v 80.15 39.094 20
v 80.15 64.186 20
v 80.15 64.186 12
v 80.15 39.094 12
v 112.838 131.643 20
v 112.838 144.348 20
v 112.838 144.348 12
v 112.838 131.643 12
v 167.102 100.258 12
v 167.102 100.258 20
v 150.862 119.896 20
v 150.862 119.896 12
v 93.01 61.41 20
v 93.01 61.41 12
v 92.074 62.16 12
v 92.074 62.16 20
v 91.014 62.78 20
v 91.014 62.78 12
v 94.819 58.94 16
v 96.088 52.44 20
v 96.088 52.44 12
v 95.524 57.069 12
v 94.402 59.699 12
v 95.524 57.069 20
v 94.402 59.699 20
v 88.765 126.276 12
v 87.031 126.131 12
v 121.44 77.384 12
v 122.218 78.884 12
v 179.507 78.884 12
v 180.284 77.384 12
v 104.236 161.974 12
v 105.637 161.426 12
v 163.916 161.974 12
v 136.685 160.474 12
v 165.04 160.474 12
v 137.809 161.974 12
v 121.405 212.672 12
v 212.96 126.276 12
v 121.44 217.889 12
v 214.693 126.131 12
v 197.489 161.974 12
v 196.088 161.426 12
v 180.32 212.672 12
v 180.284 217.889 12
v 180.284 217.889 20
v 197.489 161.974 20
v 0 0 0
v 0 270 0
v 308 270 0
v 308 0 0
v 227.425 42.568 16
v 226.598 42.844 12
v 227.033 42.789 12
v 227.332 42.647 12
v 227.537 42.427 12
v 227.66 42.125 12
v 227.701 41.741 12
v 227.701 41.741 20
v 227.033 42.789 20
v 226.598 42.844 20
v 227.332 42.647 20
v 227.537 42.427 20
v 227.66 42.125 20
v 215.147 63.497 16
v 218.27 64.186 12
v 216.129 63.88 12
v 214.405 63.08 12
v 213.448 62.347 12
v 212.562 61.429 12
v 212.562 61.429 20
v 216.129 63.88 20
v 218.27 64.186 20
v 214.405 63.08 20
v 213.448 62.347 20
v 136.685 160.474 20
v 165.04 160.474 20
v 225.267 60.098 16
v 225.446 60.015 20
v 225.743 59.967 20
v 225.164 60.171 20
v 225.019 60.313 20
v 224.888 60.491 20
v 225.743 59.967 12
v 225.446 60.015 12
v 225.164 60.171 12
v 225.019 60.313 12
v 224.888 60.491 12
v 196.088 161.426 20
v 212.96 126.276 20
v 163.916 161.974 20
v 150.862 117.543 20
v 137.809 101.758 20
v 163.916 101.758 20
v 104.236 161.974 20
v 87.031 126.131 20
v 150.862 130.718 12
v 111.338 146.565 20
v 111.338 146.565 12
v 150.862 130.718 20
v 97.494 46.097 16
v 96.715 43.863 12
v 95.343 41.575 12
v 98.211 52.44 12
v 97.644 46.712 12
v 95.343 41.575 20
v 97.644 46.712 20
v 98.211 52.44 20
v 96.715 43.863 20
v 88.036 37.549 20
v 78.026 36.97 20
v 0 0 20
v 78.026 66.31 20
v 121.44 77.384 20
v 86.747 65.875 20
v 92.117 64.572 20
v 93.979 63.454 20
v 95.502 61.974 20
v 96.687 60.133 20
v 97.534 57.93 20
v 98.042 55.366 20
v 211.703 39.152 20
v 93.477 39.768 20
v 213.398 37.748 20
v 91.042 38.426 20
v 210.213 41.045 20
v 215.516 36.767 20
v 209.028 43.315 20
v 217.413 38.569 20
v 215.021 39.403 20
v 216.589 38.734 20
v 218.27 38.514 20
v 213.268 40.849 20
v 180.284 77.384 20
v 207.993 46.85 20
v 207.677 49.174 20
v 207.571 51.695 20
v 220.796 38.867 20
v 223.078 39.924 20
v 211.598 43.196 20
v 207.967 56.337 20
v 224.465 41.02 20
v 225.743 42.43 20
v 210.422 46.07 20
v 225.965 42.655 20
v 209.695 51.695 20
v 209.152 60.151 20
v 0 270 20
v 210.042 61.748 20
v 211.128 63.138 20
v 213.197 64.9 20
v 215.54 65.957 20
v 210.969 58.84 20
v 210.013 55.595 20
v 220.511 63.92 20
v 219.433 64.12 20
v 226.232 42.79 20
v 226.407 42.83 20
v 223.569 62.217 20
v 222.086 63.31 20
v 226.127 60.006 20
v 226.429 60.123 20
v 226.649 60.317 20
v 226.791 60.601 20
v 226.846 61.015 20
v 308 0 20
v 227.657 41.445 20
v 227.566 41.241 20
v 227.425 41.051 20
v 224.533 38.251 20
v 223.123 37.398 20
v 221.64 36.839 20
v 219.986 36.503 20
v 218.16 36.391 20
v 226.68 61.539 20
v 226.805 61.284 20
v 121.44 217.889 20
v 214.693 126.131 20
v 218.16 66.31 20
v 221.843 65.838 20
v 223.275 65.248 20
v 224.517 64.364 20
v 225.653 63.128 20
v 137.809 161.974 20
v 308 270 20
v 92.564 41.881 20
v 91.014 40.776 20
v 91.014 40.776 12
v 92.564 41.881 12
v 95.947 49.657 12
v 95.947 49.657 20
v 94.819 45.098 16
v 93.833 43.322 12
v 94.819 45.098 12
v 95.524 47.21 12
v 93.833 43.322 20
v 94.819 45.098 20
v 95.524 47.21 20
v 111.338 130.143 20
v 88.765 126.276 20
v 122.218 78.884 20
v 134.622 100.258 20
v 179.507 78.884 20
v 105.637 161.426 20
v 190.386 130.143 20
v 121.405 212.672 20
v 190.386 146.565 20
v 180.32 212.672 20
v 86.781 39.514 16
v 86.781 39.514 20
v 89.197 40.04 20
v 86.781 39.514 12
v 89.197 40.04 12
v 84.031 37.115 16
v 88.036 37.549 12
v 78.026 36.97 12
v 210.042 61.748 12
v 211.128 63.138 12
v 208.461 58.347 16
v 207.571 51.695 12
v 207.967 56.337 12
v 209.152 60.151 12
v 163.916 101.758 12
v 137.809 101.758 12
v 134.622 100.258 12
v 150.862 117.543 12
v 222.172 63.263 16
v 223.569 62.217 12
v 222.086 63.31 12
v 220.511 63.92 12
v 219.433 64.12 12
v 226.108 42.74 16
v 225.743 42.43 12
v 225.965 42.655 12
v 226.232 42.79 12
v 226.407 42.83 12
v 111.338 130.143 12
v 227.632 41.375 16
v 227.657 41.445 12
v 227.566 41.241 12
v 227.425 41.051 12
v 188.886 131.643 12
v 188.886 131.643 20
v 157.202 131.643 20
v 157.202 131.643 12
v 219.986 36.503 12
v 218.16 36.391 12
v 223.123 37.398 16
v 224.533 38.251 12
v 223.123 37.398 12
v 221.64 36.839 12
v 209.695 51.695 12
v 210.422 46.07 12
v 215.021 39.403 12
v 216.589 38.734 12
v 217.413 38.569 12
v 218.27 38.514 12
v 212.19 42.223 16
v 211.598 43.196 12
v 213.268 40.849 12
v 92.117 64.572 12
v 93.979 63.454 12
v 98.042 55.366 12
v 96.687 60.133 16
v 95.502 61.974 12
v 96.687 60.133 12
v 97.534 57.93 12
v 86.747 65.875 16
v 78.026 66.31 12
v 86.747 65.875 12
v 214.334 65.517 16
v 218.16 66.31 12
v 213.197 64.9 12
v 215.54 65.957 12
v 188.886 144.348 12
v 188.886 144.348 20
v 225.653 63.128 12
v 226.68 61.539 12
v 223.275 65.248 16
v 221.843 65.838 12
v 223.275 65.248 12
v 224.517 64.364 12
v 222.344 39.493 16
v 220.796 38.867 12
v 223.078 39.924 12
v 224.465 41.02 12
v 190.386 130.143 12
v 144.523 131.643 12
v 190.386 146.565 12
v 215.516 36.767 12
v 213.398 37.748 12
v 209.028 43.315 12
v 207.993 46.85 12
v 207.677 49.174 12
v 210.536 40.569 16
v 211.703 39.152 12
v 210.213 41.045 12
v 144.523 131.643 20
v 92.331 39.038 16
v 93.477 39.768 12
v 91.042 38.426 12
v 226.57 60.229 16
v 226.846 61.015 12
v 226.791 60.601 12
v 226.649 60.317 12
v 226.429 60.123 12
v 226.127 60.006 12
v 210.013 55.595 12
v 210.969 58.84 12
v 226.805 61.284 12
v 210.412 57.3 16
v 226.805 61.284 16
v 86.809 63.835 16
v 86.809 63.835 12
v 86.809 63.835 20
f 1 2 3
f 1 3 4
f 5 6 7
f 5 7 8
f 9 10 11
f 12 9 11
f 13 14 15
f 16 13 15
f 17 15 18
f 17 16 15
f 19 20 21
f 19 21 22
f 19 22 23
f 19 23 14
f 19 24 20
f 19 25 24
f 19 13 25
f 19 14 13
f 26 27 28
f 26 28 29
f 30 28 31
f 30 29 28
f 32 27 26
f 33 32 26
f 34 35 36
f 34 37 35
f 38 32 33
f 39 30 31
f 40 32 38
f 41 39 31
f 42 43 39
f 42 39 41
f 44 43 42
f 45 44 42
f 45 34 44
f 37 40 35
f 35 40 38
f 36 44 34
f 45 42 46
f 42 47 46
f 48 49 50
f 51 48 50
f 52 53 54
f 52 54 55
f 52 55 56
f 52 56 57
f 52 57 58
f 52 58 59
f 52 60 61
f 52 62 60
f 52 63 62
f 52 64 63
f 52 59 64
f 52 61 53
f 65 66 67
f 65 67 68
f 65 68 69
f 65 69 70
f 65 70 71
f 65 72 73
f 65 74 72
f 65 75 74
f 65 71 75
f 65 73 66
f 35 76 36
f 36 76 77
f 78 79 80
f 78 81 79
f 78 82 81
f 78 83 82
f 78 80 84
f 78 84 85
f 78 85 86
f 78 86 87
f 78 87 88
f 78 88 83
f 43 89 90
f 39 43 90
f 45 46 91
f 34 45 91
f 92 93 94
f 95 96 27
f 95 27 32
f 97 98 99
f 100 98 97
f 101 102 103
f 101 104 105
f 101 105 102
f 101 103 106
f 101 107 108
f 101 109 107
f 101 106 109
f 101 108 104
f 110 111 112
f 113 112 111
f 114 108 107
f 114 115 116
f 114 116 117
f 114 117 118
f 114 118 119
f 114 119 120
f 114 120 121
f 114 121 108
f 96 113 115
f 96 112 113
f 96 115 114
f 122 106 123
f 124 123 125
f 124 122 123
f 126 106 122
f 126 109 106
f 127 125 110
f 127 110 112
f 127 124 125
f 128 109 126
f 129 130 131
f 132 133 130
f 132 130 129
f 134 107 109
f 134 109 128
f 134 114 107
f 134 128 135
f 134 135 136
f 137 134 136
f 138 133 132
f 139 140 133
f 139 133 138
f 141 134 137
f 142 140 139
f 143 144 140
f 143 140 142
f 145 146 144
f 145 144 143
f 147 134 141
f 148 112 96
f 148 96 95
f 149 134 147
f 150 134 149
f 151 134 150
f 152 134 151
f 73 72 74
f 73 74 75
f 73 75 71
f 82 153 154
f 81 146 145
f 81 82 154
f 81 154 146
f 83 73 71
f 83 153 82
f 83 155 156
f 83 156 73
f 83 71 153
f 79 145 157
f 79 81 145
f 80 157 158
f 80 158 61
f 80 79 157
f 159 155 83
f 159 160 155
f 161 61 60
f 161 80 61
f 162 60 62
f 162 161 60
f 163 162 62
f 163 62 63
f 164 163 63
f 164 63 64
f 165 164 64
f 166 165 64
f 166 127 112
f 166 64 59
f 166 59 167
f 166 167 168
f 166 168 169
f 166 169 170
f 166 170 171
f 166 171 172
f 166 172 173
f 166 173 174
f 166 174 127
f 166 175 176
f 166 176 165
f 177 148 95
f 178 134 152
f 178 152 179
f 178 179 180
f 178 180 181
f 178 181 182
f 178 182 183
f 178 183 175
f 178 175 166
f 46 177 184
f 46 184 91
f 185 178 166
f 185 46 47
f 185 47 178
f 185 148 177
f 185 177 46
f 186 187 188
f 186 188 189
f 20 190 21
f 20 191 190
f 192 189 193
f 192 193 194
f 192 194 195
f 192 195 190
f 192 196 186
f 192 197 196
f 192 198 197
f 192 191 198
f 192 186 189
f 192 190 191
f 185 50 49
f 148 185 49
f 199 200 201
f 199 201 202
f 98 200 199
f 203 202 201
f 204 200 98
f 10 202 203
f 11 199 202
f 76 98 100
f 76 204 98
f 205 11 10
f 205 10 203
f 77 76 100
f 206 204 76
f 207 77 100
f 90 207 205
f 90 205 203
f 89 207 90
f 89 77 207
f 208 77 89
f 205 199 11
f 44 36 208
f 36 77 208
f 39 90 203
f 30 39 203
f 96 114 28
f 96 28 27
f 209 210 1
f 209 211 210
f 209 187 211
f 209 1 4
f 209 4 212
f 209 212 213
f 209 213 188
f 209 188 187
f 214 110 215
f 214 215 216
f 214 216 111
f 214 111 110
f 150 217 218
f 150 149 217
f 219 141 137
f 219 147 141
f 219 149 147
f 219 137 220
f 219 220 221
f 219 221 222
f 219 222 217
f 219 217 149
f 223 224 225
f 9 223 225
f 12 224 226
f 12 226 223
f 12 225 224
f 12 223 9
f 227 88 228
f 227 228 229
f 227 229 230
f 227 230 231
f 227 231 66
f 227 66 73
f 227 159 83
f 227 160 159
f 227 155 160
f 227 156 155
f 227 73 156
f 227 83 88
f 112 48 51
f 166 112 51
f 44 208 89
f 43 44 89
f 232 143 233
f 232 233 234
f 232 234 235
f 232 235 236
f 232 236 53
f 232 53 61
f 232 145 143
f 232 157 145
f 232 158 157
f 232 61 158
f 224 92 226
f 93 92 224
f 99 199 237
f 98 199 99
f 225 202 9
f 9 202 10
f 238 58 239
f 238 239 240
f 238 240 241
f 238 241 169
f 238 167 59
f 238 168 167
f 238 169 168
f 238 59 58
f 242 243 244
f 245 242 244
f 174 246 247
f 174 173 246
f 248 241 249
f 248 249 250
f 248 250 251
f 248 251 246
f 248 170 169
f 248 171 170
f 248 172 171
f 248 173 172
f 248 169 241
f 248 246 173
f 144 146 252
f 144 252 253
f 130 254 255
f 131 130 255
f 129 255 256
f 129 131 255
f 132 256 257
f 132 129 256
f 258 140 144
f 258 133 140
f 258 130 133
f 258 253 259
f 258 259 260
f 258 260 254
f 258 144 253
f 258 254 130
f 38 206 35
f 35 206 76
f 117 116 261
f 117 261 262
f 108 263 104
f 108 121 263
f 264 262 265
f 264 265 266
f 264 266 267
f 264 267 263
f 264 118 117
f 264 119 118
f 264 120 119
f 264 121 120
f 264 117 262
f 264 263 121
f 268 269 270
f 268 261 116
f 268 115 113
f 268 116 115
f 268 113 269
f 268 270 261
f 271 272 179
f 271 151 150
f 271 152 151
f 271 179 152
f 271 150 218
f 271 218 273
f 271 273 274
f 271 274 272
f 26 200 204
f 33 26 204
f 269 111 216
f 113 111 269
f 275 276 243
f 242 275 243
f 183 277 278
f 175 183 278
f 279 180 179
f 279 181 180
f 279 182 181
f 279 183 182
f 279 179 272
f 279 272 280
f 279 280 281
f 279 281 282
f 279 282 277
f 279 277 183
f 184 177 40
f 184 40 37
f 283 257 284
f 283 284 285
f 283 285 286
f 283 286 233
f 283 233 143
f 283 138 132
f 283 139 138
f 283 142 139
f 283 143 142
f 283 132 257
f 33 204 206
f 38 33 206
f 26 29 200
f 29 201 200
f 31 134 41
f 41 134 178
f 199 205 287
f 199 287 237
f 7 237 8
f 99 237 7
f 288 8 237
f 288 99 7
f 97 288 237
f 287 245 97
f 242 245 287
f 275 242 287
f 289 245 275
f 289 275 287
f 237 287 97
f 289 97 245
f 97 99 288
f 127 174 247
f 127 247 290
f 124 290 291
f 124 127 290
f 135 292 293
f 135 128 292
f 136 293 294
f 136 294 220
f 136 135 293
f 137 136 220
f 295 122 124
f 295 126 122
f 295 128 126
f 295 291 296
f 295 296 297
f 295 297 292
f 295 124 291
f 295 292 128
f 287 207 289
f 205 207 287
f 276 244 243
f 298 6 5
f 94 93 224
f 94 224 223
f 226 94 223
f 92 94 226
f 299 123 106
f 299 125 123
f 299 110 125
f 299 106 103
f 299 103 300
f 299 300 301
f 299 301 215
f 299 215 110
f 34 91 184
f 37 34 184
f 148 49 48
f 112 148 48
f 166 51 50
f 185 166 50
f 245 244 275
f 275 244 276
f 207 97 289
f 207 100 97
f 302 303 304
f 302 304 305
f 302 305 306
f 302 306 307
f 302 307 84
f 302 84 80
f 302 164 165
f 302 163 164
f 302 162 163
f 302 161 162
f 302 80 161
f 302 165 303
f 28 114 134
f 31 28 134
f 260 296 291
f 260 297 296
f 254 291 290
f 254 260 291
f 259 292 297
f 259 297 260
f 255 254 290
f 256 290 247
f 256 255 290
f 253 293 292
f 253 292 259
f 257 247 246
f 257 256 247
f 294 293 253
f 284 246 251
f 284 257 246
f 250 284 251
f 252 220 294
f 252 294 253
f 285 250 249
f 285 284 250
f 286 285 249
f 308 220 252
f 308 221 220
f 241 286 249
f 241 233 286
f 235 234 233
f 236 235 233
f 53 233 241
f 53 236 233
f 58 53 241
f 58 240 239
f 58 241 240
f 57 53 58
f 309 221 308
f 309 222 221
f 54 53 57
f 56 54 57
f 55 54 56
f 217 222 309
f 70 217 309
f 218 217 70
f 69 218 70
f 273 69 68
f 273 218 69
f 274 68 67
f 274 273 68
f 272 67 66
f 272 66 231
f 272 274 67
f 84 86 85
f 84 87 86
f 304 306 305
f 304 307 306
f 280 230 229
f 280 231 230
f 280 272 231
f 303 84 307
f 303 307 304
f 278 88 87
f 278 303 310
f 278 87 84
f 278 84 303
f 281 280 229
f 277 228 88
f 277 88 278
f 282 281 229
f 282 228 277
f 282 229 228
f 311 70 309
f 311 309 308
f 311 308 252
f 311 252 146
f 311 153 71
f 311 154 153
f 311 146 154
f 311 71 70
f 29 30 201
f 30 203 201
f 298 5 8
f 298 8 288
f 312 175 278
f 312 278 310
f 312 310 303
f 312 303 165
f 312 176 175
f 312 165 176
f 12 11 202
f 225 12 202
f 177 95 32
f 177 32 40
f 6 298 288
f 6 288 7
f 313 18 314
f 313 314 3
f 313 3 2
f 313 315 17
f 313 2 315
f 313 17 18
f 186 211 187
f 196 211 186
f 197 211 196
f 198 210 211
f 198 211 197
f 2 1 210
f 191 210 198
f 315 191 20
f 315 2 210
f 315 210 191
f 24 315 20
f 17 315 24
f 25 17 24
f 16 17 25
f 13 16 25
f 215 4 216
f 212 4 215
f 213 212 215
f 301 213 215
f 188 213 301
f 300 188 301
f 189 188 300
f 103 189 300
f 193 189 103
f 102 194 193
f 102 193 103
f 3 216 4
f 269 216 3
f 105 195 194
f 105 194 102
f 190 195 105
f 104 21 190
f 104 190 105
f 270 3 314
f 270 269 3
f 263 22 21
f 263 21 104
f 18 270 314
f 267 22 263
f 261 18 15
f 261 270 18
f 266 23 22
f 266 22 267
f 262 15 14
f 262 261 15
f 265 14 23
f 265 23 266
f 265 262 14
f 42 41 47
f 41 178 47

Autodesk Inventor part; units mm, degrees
ref_plane "YZ Plane" through (0, 0, 0) normal (1, 0, 0) x (0, 1, 0)
ref_plane "XZ Plane" through (0, 0, 0) normal (0, 1, 0) x (-1, 0, 0)
ref_plane "XY Plane" through (0, 0, 0) normal (0, 0, 1) x (1, 0, 0)
sketch "Sketch1" plane through (0, 0, 0) normal (0, 0, 1) x (1, 0, 0)
  line L0 (0, 0) -> (308, 0)
  line L1 (308, 0) -> (308, 270)
  line L2 (308, 270) -> (0, 270)
  line L3 (0, 270) -> (0, 0)
  dimension "d0" = 308
  dimension "d1" = 270
extrude "Extrusion1" add sketch "Sketch1" along normal blind 20
sketch "Sketch2" plane through (0, 0, 20) normal (0, 0, 1) x (1, 0, 0)
  line L0 (150.8623, 77.3843) -> (180.284, 77.3843)
  line L1 (180.284, 77.3843) -> (214.6934, 126.131)
  line L2 (214.6934, 126.131) -> (197.4887, 161.9741)
  line L3 (197.4887, 161.9741) -> (180.284, 217.8894)
  line L4 (180.284, 217.8894) -> (163.9156, 161.9741)
  line L5 (163.9156, 161.9741) -> (150.8623, 161.9741)
  line L6 (150.8623, 161.9741) -> (150.8623, 77.3843) construction
  line L7 (150.8623, 77.3843) -> (121.4405, 77.3843)
  line L8 (121.4405, 77.3843) -> (87.0311, 126.131)
  line L9 (87.0311, 126.131) -> (104.2358, 161.9741)
  line L10 (104.2358, 161.9741) -> (121.4405, 217.8894)
  line L11 (121.4405, 217.8894) -> (137.8089, 161.9741)
  line L12 (137.8089, 161.9741) -> (150.8623, 161.9741)
  line L13 (308, 0) -> (308, 270) projected
  line L14 (144.5227, 131.6434) -> (112.8382, 144.3477)
  line L15 (112.8382, 144.3477) -> (112.8382, 131.6434)
  line L16 (112.8382, 131.6434) -> (144.5227, 131.6434)
  line L17 (157.2018, 131.6434) -> (188.8863, 144.3477)
  line L18 (188.8863, 144.3477) -> (188.8863, 131.6434)
  line L19 (188.8863, 131.6434) -> (157.2018, 131.6434)
  line L20 (150.8623, 117.5428) -> (137.8089, 101.7577)
  line L21 (137.8089, 101.7577) -> (163.9156, 101.7577)
  line L22 (163.9156, 101.7577) -> (150.8623, 117.5428)
  line L23 (212.9598, 126.2762) -> (179.5067, 78.8843)
  line L24 (179.5067, 78.8843) -> (150.8623, 78.8843)
  line L25 (150.8623, 78.8843) -> (122.2178, 78.8843)
  line L26 (122.2178, 78.8843) -> (88.7647, 126.2762)
  line L27 (88.7647, 126.2762) -> (105.6366, 161.426)
  line L28 (105.6366, 161.426) -> (121.4047, 212.6725)
  line L29 (121.4047, 212.6725) -> (136.6851, 160.4741)
  line L30 (136.6851, 160.4741) -> (150.8623, 160.4741)
  line L31 (150.8623, 160.4741) -> (165.0395, 160.4741)
  line L32 (165.0395, 160.4741) -> (180.3198, 212.6725)
  line L33 (180.3198, 212.6725) -> (196.0879, 161.426)
  line L34 (196.0879, 161.426) -> (212.9598, 126.2762)
  line L35 (111.3382, 146.5653) -> (150.8623, 130.7176)
  line L36 (152.2942, 130.1434) -> (111.3382, 130.1434)
  line L37 (111.3382, 130.1434) -> (111.3382, 146.5653)
  line L38 (150.8623, 130.7176) -> (190.3863, 146.5653)
  line L39 (190.3863, 146.5653) -> (190.3863, 130.1434)
  line L40 (190.3863, 130.1434) -> (149.4303, 130.1434)
  line L41 (150.8623, 119.8965) -> (134.6221, 100.2577)
  line L42 (134.6221, 100.2577) -> (167.1025, 100.2577)
  line L43 (167.1025, 100.2577) -> (150.8623, 119.8965)
  line L44 (74.5244, 66.3096) -> (229.3713, 66.3096) construction
  line L45 (229.3713, 66.3096) -> (229.3713, 36.329) construction
  line L46 (229.3713, 36.329) -> (74.5244, 36.329) construction
  line L47 (74.5244, 36.329) -> (74.5244, 66.3096) construction
  line L48 (208.446, 49.8524) -> (208.446, 52.8954)
  line L49 (97.2006, 52.8954) -> (97.2006, 49.8524)
  spline S0 degree 2 poles (98.2109, 52.4396) (98.2109, 45.1875) (95.3431, 41.5752) knots 0 0 0 1 1 1
  spline S1 degree 2 poles (95.3431, 41.5752) (92.9717, 38.5145) (88.0359, 37.5494) knots 0 0 0 1 1 1
  spline S2 degree 2 poles (88.0359, 37.5494) (85.0303, 36.9703) (78.0264, 36.9703) knots 0 0 0 1 1 1
  line L50 (78.0264, 36.9703) -> (78.0264, 66.3096)
  spline S3 degree 2 poles (78.0264, 66.3096) (88.4219, 66.3096) (92.1169, 64.5724) knots 0 0 0 1 1 1
  spline S4 degree 2 poles (92.1169, 64.5724) (98.2109, 61.7598) (98.2109, 52.4396) knots 0 0 0 1 1 1
  spline S5 degree 2 poles (96.0877, 52.4396) (96.0877, 60.2707) (91.0139, 62.78) knots 0 0 0 1 1 1
  spline S6 degree 2 poles (91.0139, 62.78) (88.0359, 64.1863) (80.1496, 64.1863) knots 0 0 0 1 1 1
  line L51 (80.1496, 64.1863) -> (80.1496, 39.0935)
  spline S7 degree 2 poles (80.1496, 39.0935) (87.9808, 39.0935) (91.0139, 40.7756) knots 0 0 0 1 1 1
  spline S8 degree 2 poles (91.0139, 40.7756) (96.0877, 43.5882) (96.0877, 52.4396) knots 0 0 0 1 1 1
  spline S9 degree 2 poles (227.425, 41.0513) (225.219, 38.4042) (221.0277, 36.3912) (218.1599, 36.3912) knots 0 0 0 1 2 2 2
  spline S10 degree 2 poles (218.1599, 36.3912) (213.4998, 36.3912) (207.5713, 44.7463) (207.5713, 51.6951) knots 0 0 0 1 2 2 2
  spline S11 degree 2 poles (207.5713, 51.6951) (207.5713, 59.2781) (211.1284, 63.1385) knots 0 0 0 1 1 1
  spline S12 degree 2 poles (211.1284, 63.1385) (214.0238, 66.3096) (218.1599, 66.3096) knots 0 0 0 1 1 1
  spline S13 degree 2 poles (218.1599, 66.3096) (221.331, 66.3096) (225.219, 64.1863) (226.6804, 61.5392) knots 0 0 0 1 2 2 2
  spline S14 degree 2 poles (226.6804, 61.5392) (226.8459, 61.291) (226.8459, 61.0153) knots 0 0 0 1 1 1
  spline S15 degree 2 poles (226.8459, 61.0153) (226.8459, 59.9674) (225.7429, 59.9674) knots 0 0 0 1 1 1
  spline S16 degree 2 poles (225.7429, 59.9674) (225.219, 59.9674) (224.8881, 60.4913) knots 0 0 0 1 1 1
  spline S17 degree 2 poles (224.8881, 60.4913) (222.7649, 64.1863) (218.2702, 64.1863) knots 0 0 0 1 1 1
  spline S18 degree 2 poles (218.2702, 64.1863) (214.8786, 64.1863) (212.5623, 61.4289) knots 0 0 0 1 1 1
  spline S19 degree 2 poles (212.5623, 61.4289) (209.6946, 58.0372) (209.6946, 51.6951) knots 0 0 0 1 1 1
  spline S20 degree 2 poles (209.6946, 51.6951) (209.6946, 45.932) (214.6855, 38.5145) (218.2702, 38.5145) knots 0 0 0 1 2 2 2
  spline S21 degree 2 poles (218.2702, 38.5145) (222.6821, 38.5145) (225.7429, 42.43) knots 0 0 0 1 1 1
  spline S22 degree 2 poles (225.7429, 42.43) (226.0462, 42.8437) (226.5977, 42.8437) knots 0 0 0 1 1 1
  spline S23 degree 2 poles (226.5977, 42.8437) (227.7007, 42.8437) (227.7007, 41.7407) knots 0 0 0 1 1 1
  spline S24 degree 2 poles (227.7007, 41.7407) (227.7007, 41.3546) (227.425, 41.0513) knots 0 0 0 1 1 1
  point P0 (0, 0)
  point P1 (150.8623, 130.1434)
  dimension "d5" = 1.5
  dimension "d6" = 1.5
  dimension "d7" = 1.5
  dimension "d8" = 1.5
extrude "Extrusion2" cut sketch "Sketch2" against normal blind 8
properties part number "Tablero_DC_007"
